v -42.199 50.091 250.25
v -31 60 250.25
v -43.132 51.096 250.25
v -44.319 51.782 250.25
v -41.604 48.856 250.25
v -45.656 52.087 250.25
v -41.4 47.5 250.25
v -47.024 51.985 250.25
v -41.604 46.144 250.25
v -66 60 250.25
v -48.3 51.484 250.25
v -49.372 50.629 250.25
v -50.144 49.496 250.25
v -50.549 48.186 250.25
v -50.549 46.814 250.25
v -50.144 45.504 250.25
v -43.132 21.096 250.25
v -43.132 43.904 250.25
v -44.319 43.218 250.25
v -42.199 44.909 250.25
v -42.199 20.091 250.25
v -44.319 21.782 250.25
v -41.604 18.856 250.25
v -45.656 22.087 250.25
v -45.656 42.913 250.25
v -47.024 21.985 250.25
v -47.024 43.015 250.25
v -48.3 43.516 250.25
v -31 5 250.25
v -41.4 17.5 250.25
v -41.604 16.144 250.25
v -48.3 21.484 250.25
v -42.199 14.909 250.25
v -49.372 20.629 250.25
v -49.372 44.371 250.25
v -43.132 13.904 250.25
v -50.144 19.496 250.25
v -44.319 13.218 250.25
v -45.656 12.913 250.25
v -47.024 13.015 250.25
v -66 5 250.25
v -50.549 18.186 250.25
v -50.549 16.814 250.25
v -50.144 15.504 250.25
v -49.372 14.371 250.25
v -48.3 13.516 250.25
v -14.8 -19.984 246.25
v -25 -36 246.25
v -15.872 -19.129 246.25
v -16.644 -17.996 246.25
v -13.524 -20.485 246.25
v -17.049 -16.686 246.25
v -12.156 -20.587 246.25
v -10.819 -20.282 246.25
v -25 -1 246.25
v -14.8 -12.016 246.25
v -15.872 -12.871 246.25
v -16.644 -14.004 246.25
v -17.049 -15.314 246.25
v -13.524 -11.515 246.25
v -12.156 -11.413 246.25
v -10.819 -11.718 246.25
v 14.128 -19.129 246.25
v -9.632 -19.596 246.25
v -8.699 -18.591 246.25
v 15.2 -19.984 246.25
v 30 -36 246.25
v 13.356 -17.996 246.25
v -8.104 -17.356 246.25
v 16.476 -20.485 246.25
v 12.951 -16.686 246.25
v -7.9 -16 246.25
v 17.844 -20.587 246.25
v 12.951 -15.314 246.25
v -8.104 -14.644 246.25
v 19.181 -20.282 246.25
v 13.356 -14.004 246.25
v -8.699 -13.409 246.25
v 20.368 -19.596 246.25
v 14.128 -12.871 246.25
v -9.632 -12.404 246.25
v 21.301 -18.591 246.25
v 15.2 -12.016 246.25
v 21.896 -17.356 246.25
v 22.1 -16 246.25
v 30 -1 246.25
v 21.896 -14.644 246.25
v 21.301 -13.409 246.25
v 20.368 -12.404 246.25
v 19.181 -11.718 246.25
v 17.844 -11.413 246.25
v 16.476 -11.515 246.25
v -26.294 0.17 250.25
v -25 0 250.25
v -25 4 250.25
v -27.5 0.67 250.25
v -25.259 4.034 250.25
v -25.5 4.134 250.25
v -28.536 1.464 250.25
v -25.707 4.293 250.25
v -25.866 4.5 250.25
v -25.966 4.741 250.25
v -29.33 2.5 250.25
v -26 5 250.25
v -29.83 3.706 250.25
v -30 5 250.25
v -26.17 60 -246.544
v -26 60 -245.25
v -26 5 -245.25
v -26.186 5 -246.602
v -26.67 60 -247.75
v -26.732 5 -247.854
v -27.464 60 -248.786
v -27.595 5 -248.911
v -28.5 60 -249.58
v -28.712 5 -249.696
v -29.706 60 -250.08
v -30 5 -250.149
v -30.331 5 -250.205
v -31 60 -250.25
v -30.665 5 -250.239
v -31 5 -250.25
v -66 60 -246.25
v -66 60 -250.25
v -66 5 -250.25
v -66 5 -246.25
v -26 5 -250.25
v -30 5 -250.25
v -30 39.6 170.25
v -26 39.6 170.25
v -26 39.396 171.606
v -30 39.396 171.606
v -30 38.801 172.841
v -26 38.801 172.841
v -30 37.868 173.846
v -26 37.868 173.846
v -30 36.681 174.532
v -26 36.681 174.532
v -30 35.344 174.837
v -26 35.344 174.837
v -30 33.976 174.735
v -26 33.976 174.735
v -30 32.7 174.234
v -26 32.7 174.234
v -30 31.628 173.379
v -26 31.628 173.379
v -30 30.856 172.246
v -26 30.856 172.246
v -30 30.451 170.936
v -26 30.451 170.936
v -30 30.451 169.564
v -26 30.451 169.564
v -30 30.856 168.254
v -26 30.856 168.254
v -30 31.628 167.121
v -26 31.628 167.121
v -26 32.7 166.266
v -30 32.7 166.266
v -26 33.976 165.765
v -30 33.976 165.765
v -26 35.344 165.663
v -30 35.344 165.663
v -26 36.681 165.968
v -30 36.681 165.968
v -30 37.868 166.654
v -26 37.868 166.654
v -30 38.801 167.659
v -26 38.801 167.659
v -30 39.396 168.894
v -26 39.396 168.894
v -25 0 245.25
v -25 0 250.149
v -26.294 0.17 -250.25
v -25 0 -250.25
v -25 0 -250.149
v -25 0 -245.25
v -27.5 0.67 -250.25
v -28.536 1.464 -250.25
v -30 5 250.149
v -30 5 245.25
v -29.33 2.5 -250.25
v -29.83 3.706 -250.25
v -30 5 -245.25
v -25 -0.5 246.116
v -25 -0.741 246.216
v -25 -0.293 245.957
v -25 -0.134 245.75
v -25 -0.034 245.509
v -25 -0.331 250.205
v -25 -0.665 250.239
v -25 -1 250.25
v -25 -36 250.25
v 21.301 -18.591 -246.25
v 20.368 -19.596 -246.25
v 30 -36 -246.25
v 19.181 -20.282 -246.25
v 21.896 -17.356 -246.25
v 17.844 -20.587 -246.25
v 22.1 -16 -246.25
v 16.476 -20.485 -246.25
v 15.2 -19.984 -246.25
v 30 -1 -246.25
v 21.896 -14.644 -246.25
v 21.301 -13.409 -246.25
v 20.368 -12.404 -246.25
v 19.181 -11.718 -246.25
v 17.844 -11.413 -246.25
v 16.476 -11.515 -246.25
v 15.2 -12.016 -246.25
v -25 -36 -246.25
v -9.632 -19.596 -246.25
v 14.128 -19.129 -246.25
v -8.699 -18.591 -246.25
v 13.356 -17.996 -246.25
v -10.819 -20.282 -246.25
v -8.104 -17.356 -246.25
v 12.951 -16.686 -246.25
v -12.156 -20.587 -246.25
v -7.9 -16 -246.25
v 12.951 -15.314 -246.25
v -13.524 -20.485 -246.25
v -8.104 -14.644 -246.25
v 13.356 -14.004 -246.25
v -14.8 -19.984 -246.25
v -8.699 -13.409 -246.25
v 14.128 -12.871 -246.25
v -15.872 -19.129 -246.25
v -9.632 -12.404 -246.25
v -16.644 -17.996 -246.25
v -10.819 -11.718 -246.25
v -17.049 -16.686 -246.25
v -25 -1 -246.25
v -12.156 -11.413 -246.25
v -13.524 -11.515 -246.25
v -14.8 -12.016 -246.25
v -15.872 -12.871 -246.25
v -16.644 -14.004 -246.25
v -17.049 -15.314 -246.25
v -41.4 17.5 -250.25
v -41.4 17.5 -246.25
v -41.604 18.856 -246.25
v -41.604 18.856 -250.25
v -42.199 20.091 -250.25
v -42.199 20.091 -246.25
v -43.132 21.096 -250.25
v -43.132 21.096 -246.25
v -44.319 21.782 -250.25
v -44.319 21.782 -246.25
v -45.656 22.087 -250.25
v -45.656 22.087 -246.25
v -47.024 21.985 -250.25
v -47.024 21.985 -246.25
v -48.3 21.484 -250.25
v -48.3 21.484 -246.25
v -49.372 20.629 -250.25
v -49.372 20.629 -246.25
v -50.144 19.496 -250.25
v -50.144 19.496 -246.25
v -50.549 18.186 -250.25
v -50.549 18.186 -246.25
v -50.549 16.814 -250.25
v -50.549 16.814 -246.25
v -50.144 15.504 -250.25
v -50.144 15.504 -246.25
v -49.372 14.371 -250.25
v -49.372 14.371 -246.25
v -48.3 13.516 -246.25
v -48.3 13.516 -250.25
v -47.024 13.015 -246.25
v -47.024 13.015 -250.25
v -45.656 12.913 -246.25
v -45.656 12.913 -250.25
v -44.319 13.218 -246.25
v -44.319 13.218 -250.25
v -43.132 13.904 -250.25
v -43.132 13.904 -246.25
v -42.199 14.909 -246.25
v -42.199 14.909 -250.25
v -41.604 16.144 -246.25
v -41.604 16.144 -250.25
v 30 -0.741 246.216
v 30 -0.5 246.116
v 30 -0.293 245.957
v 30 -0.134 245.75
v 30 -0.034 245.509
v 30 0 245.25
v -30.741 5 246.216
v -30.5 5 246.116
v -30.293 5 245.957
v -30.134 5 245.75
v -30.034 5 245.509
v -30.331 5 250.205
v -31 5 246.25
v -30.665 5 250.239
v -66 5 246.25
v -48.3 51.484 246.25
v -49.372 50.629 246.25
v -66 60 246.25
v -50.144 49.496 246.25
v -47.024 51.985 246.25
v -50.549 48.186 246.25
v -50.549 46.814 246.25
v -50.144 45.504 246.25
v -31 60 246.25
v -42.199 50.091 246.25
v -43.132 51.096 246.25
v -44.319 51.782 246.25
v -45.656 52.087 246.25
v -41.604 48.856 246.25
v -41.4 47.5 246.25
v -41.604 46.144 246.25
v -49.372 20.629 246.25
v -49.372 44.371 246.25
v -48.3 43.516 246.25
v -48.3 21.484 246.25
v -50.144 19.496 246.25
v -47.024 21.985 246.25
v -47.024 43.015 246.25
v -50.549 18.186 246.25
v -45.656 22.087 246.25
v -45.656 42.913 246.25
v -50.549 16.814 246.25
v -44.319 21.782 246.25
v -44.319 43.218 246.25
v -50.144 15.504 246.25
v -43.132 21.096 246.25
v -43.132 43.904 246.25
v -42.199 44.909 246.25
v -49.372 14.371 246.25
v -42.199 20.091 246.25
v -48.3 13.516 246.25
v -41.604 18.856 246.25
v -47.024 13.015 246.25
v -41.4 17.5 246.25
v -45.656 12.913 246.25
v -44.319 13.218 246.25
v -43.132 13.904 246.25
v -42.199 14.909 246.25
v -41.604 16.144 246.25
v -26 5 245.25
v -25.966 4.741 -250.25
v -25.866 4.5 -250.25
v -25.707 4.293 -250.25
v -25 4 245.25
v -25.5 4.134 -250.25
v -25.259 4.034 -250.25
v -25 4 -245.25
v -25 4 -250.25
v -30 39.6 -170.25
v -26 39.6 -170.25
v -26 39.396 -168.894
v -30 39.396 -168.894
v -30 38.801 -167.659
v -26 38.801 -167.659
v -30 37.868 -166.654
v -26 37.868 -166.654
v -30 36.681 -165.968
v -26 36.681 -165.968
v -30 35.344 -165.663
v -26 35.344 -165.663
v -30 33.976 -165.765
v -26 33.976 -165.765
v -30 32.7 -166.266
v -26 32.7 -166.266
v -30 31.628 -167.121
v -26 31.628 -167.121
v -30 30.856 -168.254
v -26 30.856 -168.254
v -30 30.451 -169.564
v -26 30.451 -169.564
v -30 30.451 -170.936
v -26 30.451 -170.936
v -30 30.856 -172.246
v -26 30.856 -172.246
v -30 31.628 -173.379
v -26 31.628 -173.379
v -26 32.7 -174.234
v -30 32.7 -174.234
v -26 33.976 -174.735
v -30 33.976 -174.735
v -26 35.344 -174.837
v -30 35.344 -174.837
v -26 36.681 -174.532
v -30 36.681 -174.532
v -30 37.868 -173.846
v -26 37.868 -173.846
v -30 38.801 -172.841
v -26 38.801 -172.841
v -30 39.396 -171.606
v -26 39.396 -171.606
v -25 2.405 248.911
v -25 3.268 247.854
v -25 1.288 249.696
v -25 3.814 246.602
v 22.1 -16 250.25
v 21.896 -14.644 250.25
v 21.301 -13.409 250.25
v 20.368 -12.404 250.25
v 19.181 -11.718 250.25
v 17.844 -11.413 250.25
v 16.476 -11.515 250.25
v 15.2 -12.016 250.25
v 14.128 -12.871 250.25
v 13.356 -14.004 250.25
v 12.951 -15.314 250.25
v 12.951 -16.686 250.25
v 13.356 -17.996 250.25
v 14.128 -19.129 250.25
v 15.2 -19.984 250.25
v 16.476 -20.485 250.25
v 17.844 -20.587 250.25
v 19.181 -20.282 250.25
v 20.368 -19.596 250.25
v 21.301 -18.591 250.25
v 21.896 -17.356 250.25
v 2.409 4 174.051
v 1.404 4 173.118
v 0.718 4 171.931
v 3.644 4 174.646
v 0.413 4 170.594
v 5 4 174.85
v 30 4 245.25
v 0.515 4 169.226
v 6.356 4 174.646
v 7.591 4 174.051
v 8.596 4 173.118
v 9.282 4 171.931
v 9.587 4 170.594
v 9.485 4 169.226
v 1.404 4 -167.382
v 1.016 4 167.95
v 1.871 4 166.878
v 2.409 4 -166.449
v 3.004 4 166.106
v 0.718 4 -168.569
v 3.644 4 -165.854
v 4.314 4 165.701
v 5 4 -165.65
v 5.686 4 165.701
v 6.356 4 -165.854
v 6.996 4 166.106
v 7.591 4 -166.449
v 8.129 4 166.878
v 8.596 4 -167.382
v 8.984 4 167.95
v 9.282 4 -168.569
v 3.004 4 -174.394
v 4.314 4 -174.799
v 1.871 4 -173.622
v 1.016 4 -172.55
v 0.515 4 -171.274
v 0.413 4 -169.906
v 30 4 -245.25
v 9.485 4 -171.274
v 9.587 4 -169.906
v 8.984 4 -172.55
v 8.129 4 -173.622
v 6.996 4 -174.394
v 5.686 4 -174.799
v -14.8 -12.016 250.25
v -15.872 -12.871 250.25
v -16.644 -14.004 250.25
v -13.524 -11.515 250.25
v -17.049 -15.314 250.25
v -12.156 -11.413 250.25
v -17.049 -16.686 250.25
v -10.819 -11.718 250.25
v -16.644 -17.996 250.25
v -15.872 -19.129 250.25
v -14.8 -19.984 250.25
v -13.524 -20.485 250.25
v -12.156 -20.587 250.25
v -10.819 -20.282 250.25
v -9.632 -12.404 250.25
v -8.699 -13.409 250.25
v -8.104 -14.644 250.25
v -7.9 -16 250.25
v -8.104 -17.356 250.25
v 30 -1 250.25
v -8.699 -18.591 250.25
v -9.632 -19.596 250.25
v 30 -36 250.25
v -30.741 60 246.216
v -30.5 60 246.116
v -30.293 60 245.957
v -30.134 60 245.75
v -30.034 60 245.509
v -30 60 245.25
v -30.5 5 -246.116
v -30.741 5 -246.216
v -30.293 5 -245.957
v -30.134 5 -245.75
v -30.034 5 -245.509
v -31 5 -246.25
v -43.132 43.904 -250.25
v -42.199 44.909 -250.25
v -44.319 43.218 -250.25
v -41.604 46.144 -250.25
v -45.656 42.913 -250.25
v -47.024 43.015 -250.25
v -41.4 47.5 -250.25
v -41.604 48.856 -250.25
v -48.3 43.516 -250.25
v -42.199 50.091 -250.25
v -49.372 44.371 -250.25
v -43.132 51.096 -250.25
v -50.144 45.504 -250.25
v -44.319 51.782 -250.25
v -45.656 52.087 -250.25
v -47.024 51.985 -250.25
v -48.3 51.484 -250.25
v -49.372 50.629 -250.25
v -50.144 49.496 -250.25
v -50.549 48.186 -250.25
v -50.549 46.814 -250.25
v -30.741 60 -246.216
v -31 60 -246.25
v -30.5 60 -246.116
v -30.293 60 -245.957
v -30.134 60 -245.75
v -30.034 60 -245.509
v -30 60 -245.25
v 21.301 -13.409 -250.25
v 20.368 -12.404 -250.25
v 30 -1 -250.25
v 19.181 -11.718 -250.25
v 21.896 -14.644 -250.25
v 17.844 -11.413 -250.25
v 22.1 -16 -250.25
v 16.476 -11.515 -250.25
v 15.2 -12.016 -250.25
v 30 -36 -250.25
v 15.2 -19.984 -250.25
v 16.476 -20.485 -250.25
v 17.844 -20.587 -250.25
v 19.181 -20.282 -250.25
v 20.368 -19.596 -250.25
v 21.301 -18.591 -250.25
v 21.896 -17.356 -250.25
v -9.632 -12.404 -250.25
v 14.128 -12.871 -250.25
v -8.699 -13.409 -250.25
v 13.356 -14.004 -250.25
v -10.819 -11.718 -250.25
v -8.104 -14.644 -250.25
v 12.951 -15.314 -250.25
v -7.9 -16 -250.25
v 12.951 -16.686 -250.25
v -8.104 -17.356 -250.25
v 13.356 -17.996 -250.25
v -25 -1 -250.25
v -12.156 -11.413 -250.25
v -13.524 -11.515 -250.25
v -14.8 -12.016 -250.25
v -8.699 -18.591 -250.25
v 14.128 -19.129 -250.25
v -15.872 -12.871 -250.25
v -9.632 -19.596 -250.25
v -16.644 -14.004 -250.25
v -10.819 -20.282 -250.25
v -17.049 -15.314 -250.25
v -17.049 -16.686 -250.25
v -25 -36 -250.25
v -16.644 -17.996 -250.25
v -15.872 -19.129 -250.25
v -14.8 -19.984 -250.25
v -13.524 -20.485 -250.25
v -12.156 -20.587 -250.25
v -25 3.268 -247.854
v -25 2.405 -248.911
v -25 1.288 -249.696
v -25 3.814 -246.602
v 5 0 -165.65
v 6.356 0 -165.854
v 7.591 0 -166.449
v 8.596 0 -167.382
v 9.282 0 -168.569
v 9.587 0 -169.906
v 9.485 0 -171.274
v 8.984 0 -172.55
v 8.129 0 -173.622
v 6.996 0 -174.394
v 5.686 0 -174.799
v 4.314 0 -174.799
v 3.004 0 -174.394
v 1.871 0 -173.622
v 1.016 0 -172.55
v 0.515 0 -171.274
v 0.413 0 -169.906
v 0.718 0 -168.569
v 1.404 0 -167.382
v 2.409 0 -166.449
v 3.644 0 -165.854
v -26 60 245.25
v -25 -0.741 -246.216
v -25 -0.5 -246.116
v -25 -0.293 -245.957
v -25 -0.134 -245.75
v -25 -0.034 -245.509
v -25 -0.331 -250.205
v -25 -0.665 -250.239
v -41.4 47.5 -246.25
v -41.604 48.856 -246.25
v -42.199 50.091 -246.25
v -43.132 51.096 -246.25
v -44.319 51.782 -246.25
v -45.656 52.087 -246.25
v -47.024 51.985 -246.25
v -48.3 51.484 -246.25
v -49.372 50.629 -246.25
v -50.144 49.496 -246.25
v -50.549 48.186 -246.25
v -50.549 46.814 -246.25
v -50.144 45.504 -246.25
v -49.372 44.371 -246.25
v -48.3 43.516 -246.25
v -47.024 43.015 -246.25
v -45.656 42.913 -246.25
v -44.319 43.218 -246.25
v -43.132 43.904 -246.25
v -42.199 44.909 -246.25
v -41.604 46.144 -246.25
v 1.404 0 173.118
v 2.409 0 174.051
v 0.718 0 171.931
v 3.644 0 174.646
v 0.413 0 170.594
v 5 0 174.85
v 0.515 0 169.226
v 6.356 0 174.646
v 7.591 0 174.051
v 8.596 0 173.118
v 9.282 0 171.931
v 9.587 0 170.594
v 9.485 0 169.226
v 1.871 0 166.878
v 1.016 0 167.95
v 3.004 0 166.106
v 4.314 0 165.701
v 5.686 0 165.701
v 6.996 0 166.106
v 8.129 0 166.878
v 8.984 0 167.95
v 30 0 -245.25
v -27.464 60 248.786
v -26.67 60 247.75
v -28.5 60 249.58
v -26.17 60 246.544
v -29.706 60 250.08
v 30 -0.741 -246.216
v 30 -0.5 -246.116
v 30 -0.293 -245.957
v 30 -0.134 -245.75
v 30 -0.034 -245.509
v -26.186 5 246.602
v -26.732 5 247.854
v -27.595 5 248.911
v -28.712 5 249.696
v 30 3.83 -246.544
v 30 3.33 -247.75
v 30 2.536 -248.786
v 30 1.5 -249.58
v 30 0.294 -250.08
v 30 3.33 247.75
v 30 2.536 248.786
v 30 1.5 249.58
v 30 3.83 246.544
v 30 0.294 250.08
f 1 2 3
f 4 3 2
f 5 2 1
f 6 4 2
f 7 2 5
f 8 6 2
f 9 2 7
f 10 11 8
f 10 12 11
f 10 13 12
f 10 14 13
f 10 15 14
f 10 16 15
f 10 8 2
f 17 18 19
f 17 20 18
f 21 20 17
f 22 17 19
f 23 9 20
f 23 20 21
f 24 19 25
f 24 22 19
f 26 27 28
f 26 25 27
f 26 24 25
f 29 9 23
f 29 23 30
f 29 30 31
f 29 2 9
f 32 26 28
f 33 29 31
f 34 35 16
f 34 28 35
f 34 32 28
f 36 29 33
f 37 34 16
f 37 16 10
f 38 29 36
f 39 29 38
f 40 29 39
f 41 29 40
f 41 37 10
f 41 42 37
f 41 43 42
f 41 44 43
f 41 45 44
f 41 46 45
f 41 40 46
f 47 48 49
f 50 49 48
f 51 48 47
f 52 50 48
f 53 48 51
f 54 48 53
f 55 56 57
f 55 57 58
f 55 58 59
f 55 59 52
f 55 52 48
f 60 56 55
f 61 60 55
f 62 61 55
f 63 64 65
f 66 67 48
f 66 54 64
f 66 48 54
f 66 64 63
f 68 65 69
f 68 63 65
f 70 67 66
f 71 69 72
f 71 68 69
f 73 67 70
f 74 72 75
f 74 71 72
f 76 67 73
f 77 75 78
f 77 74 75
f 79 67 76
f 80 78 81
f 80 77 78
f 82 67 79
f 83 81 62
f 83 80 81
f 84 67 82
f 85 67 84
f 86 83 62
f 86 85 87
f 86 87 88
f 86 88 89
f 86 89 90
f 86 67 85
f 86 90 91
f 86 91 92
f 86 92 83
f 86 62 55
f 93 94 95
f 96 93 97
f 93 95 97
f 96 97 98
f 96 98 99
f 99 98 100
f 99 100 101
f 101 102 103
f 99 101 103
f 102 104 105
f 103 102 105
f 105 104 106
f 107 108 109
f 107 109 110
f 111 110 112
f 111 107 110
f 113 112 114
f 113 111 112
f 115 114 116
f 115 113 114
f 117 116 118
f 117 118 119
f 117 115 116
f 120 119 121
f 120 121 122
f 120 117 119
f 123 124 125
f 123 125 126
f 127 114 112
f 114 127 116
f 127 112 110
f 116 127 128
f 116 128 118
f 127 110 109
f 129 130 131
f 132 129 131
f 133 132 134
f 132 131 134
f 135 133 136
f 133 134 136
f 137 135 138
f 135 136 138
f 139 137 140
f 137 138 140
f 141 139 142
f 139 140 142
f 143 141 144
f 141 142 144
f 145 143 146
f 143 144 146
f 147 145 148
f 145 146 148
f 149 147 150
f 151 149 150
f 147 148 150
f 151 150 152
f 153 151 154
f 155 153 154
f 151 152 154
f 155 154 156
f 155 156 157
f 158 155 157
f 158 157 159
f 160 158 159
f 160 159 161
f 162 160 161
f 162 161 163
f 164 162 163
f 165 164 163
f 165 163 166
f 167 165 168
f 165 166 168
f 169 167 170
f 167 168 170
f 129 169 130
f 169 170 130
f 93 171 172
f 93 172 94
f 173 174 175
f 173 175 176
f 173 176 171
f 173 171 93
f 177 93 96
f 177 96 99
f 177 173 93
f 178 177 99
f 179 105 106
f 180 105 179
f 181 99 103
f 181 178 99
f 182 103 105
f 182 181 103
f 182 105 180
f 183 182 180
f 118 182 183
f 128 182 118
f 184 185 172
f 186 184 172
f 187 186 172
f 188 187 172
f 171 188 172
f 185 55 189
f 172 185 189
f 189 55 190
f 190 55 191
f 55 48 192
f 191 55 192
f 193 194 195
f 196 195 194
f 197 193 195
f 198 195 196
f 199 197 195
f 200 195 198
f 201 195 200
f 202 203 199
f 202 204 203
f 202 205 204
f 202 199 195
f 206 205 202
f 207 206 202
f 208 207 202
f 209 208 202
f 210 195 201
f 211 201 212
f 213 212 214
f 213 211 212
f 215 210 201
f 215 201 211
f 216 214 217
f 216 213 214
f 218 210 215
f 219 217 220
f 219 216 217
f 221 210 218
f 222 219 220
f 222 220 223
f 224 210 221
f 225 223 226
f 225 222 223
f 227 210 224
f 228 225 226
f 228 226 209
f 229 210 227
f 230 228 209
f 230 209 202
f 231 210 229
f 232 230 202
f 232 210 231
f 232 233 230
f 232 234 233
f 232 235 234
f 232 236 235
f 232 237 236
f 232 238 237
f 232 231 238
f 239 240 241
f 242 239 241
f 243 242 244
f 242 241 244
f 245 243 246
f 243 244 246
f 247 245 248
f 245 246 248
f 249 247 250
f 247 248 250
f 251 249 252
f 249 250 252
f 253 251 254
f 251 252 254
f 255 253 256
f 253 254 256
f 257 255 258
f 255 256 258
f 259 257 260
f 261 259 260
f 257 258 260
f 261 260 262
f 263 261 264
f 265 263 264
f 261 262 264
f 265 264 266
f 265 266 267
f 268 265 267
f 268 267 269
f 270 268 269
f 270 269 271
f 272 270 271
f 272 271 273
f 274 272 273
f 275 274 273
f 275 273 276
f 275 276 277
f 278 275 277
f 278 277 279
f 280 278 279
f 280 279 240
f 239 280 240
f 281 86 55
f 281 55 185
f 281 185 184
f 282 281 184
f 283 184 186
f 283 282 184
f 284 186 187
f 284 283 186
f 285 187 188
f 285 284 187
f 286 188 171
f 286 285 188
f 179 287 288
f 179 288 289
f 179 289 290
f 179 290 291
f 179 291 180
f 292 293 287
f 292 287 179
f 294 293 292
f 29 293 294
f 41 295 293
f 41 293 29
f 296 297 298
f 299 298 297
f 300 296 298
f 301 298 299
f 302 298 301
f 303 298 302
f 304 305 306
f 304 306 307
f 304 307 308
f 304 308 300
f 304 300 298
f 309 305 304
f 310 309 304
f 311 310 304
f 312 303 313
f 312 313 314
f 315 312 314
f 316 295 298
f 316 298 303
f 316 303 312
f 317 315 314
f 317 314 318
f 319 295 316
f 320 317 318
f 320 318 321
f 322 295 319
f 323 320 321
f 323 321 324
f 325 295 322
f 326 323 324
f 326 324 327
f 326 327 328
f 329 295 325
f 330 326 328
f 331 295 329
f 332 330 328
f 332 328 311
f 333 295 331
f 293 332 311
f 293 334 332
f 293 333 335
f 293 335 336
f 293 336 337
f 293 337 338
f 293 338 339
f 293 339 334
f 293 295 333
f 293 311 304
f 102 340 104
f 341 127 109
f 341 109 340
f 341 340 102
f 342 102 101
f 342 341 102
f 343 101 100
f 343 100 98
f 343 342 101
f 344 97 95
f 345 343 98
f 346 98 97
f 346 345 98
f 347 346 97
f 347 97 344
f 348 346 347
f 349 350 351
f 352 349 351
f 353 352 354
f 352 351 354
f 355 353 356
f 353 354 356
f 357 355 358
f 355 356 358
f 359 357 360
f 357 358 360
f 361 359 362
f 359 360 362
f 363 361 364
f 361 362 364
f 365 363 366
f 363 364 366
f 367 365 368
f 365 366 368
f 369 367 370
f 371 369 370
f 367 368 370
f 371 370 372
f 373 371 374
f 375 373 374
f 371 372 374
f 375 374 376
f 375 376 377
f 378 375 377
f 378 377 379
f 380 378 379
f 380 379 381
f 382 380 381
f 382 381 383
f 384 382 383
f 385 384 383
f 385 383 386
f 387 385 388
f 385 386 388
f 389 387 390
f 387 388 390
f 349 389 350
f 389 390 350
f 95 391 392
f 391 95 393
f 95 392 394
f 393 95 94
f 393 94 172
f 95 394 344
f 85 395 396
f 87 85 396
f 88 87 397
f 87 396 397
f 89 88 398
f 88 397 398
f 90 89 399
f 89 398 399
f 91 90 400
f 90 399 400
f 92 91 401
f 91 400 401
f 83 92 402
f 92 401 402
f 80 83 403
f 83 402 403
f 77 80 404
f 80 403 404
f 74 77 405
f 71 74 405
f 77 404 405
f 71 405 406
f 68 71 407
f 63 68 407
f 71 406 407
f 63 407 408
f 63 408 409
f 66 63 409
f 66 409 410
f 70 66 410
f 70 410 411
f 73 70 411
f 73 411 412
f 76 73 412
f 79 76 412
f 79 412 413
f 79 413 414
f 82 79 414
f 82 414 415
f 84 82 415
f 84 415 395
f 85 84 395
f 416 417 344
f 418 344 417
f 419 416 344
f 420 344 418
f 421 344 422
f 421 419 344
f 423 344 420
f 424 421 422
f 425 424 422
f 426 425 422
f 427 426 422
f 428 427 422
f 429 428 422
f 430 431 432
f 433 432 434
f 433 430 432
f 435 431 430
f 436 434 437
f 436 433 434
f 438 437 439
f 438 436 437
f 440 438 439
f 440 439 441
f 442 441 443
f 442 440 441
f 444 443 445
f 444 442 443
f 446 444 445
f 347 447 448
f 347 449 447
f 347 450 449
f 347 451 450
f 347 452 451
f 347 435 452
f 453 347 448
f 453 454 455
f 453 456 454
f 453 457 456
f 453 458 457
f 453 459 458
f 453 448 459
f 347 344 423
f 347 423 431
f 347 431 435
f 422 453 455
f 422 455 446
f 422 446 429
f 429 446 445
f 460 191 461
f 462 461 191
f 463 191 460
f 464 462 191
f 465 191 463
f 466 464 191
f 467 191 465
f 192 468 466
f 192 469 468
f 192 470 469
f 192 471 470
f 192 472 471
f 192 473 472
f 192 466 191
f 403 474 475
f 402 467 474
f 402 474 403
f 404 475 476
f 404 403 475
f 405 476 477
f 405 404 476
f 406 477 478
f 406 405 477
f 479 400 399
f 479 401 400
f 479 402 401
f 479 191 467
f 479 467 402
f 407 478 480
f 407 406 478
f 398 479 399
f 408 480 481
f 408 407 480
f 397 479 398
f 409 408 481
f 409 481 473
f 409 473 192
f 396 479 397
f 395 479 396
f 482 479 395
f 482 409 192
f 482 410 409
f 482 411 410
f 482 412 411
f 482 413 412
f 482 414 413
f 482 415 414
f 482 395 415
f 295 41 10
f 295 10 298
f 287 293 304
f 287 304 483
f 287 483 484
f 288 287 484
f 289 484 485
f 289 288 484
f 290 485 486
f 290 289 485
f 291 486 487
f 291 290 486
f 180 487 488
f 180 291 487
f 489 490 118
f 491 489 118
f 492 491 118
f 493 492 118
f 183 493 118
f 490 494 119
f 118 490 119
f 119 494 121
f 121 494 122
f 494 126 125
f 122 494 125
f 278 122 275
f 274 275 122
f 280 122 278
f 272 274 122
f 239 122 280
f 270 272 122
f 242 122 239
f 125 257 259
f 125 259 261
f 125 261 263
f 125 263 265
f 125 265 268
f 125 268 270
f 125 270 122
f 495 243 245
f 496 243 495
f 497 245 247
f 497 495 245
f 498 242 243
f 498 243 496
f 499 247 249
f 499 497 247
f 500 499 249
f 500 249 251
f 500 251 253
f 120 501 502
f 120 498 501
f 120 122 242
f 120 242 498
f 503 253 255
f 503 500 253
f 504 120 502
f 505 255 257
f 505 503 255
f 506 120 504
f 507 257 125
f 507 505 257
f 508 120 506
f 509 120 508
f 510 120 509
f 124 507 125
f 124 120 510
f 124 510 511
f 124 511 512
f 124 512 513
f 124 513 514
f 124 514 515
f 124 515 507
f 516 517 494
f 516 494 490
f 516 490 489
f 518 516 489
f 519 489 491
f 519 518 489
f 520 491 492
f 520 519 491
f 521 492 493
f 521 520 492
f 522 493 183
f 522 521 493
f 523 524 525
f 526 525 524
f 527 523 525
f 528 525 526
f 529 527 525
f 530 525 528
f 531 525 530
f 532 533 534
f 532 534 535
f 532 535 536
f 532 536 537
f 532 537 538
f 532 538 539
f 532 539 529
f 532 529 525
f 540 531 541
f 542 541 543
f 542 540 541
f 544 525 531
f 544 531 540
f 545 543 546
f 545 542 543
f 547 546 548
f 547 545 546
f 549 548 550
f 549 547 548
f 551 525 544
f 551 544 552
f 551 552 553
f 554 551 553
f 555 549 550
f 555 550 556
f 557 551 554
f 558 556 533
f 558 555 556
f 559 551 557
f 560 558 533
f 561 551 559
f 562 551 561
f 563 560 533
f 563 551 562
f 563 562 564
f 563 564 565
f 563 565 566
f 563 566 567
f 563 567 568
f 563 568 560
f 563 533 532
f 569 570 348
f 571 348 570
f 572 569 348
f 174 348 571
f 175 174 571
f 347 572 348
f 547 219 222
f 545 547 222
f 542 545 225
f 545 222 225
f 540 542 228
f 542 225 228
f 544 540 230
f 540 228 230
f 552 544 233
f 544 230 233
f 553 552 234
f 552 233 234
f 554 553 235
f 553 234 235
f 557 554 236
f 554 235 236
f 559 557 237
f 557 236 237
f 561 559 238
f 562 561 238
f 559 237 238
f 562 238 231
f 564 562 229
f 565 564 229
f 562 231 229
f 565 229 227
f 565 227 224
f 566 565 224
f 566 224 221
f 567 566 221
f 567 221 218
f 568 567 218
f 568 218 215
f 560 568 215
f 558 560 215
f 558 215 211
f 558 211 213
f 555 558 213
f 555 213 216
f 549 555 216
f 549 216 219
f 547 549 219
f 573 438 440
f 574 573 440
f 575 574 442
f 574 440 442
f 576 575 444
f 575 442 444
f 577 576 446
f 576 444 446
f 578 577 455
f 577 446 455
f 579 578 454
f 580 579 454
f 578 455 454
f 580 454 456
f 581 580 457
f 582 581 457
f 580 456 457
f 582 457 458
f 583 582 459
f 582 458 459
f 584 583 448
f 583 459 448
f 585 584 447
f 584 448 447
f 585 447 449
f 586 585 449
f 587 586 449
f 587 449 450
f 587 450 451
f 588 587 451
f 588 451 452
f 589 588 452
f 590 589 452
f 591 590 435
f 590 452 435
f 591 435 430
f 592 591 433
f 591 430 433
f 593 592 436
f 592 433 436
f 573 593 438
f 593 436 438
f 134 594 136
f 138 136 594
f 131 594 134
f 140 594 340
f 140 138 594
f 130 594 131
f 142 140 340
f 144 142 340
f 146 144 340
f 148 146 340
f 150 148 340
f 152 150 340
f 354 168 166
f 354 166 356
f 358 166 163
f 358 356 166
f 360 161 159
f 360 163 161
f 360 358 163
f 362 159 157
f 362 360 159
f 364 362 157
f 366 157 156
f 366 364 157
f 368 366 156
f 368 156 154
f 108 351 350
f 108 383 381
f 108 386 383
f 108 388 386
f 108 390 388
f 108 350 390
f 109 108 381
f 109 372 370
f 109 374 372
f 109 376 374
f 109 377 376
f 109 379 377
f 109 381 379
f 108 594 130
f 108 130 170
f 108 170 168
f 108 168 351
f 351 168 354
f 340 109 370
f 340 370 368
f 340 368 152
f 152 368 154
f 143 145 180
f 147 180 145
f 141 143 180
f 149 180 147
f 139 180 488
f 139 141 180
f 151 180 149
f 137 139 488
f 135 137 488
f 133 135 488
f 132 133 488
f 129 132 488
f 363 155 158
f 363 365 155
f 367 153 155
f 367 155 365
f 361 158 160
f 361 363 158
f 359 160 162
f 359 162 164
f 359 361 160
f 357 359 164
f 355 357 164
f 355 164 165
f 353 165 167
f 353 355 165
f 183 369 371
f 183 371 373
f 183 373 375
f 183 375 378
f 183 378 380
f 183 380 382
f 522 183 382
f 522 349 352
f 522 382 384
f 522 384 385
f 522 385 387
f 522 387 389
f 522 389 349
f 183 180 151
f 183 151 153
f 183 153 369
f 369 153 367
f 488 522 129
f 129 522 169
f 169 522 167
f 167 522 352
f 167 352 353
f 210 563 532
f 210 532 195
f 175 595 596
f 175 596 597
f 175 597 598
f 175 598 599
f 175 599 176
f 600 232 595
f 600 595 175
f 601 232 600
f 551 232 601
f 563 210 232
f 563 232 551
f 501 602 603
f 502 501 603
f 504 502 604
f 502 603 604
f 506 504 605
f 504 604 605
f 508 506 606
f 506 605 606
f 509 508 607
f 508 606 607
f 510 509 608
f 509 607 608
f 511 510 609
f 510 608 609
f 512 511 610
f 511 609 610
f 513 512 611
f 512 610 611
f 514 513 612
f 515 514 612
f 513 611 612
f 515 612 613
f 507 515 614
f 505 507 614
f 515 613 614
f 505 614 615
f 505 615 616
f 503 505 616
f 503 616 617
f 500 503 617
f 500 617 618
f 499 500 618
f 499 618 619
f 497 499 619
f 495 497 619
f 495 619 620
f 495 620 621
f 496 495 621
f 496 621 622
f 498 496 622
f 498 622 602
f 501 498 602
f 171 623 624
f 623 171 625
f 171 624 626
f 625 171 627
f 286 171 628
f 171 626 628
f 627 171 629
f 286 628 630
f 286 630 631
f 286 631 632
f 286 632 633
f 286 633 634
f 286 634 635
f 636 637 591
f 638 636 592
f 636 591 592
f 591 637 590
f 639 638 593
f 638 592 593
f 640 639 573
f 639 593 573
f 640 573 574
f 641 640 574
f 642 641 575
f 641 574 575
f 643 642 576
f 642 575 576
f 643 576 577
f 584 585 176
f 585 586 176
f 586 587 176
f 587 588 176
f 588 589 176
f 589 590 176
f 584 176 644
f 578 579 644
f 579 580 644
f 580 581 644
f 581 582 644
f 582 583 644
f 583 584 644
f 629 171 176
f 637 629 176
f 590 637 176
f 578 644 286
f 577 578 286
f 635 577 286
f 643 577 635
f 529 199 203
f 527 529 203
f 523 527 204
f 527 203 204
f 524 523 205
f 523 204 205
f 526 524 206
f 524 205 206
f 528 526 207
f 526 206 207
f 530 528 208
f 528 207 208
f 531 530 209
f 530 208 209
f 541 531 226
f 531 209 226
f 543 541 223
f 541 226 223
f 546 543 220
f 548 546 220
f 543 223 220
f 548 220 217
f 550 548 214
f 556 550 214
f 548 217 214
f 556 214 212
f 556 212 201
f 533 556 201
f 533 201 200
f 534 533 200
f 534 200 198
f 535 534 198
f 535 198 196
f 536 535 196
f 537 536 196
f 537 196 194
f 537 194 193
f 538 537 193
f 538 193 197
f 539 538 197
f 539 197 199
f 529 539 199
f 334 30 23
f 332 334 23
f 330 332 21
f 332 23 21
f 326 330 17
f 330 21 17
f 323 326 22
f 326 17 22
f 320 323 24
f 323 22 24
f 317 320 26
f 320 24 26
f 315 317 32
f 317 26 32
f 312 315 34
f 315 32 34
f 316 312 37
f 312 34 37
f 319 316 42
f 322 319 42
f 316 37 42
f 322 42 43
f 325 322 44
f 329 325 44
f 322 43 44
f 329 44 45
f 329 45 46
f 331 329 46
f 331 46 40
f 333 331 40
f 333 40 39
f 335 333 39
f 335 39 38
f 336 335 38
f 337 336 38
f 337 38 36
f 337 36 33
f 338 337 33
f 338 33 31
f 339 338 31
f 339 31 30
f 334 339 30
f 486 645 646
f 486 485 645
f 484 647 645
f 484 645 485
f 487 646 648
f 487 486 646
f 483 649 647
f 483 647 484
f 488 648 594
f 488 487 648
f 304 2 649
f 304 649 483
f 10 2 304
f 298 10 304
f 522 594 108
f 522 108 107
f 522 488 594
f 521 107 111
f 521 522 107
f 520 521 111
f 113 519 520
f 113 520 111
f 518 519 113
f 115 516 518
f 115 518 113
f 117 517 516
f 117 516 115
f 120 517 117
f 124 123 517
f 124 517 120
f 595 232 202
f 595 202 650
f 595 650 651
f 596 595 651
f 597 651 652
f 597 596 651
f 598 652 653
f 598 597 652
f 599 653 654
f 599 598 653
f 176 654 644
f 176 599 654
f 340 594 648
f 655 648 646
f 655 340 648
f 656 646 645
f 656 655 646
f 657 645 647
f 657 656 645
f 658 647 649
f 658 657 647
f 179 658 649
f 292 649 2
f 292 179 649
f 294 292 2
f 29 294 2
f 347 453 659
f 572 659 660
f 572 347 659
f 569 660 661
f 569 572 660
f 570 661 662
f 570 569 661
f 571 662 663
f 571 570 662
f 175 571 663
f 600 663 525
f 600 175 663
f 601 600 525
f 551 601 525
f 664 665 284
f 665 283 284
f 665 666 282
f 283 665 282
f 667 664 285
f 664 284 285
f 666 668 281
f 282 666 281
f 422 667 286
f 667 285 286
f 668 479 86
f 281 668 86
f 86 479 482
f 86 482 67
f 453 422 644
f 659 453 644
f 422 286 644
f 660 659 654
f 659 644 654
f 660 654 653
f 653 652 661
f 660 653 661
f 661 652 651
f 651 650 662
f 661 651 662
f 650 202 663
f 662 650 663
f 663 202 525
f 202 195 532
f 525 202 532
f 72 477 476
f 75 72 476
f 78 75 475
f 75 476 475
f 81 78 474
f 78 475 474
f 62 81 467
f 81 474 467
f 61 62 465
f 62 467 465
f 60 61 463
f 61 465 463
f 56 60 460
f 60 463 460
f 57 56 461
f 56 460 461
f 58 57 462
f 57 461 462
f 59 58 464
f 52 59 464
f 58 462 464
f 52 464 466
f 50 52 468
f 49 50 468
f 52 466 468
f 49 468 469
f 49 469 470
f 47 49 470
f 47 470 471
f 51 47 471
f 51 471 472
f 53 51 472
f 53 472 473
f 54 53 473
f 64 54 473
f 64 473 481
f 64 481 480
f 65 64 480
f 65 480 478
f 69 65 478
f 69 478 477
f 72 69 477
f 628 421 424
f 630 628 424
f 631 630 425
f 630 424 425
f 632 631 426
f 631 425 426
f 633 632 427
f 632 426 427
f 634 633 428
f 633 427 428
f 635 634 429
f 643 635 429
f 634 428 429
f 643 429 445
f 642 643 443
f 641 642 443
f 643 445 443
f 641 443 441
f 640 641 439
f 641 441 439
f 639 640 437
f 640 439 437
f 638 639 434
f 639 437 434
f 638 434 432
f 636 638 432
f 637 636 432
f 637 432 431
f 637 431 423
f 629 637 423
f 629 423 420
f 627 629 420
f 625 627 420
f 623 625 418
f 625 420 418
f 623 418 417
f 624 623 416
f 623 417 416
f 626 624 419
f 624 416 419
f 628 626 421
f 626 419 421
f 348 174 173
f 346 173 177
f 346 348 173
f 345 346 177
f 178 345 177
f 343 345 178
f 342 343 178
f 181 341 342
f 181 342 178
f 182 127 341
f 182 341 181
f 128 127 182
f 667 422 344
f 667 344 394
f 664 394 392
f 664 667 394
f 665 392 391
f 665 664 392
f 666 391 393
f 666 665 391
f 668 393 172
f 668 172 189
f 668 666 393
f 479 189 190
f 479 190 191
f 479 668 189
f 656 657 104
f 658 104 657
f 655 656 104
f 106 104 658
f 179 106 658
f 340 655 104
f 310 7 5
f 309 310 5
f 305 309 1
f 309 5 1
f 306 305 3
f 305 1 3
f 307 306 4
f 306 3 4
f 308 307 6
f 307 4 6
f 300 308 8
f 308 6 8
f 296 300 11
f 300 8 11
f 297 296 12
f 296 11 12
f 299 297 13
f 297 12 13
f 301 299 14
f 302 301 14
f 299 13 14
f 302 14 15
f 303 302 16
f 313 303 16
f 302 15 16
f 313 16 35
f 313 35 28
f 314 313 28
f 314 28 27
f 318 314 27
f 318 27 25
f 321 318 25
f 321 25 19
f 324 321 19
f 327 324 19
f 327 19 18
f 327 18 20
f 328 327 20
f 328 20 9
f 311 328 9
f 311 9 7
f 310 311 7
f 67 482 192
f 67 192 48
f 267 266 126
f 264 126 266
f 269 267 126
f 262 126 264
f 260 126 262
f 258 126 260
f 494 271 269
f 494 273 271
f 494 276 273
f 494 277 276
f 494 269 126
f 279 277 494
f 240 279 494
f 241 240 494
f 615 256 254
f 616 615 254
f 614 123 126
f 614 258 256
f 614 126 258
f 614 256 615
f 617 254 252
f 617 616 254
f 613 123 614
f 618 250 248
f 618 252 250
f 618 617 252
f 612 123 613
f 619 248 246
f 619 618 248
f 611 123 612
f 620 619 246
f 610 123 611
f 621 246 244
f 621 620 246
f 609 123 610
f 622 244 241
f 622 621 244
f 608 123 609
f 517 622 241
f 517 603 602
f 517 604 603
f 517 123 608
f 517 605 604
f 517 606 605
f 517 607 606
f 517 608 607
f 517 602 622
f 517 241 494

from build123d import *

# Parameters (mm, degrees)
SKETCH1_W                      = 60
SKETCH1_H                      = 500.5
BASE_FLANGE1_DEPTH             = 4
EDGE_FLANGE1_STRIP_W           = 18
EDGE_FLANGE1_STRIP_H           = 4
EDGE_FLANGE1_STRIP_CUT_DEPTH   = 500.5
EDGE_FLANGE1_DEPTH             = 500.5
EDGE_FLANGE2_STRIP_W           = 18
EDGE_FLANGE2_STRIP_H           = 4
EDGE_FLANGE2_STRIP_CUT_DEPTH   = 55
EDGE_FLANGE2_STRIP_2_W         = 18
EDGE_FLANGE2_STRIP_2_H         = 4
EDGE_FLANGE2_STRIP_CUT_2_DEPTH = 55
EDGE_FLANGE2_STRIP_3_W         = 18
EDGE_FLANGE2_STRIP_3_H         = 4
EDGE_FLANGE2_STRIP_CUT_3_DEPTH = 55
EDGE_FLANGE2_STRIP_4_W         = 18
EDGE_FLANGE2_STRIP_4_H         = 4
EDGE_FLANGE2_STRIP_CUT_4_DEPTH = 55
EDGE_FLANGE2_DEPTH             = 55
EDGE_FLANGE2_BEND_DEPTH        = 55
EDGE_FLANGE2_BEND_2_DEPTH      = 55
EDGE_FLANGE2_BEND_3_DEPTH      = 55
SKETCH18_R                     = 4.6
EXTRUDE1_DEPTH                 = 509.385926241
SKETCH19_R                     = 4.6
EXTRUDE2_DEPTH                 = 4
SKETCH20_R                     = 4.6
EXTRUDE3_DEPTH                 = 4


# Sheet-metal steps are written as plain solids
with BuildPart() as part:
    # Sketch1 → Base-Flange1 (new body)
    with BuildSketch(Plane(origin=(0, 0, 0), x_dir=(1, 0, 0), z_dir=(0, 1, 0))):
        Rectangle(SKETCH1_W, SKETCH1_H)
    extrude(amount=BASE_FLANGE1_DEPTH)

    # Edge-Flange1 strip (across the edge) → Edge-Flange1 strip cut (cut)
    with BuildSketch(Plane(origin=(-30, 4, -250.25), x_dir=(1, 0, 0), z_dir=(0, 0, 1))):
        with Locations((-4, -2)):
            Rectangle(EDGE_FLANGE1_STRIP_W, EDGE_FLANGE1_STRIP_H)
    extrude(amount=EDGE_FLANGE1_STRIP_CUT_DEPTH, mode=Mode.SUBTRACT)

    # Edge-Flange1 section (across the edge) → Edge-Flange1 (add)
    with BuildSketch(Plane(origin=(-30, 4, -250.25), x_dir=(1, 0, 0), z_dir=(0, 0, 1))):
        with BuildLine():
            Line((0, 1), (0, 56))
            Line((0, 56), (4, 56))
            Line((4, 56), (4, 1))
            ThreePointArc((4, 1), (4.292893219, 0.292893219), (5, 0))
            Line((5, 0), (5, -4))
            ThreePointArc((5, -4), (1.464466094, -2.535533906), (0, 1))
        make_face()
    extrude(amount=EDGE_FLANGE1_DEPTH)

    # Edge-Flange2 strip (across the edge) → Edge-Flange2 strip cut (cut)
    with BuildSketch(Plane(origin=(-30, 5, 250.25), x_dir=(0, 0, -1), z_dir=(0, 1, 0))):
        with Locations((-4, -2)):
            Rectangle(EDGE_FLANGE2_STRIP_W, EDGE_FLANGE2_STRIP_H)
    extrude(amount=EDGE_FLANGE2_STRIP_CUT_DEPTH, mode=Mode.SUBTRACT)

    # Edge-Flange2 strip 2 (across the edge) → Edge-Flange2 strip cut 2 (cut)
    with BuildSketch(Plane(origin=(30, 0, 250.25), x_dir=(0, 0, -1), z_dir=(-1, 0, 0))):
        with Locations((-4, -2)):
            Rectangle(EDGE_FLANGE2_STRIP_2_W, EDGE_FLANGE2_STRIP_2_H)
    extrude(amount=EDGE_FLANGE2_STRIP_CUT_2_DEPTH, mode=Mode.SUBTRACT)

    # Edge-Flange2 strip 3 (across the edge) → Edge-Flange2 strip cut 3 (cut)
    with BuildSketch(Plane(origin=(-30, 60, -250.25), x_dir=(0, 0, 1), z_dir=(0, -1, 0))):
        with Locations((-4, -2)):
            Rectangle(EDGE_FLANGE2_STRIP_3_W, EDGE_FLANGE2_STRIP_3_H)
    extrude(amount=EDGE_FLANGE2_STRIP_CUT_3_DEPTH, mode=Mode.SUBTRACT)

    # Edge-Flange2 strip 4 (across the edge) → Edge-Flange2 strip cut 4 (cut)
    with BuildSketch(Plane(origin=(-25, 0, -250.25), x_dir=(0, 0, 1), z_dir=(1, 0, 0))):
        with Locations((-4, -2)):
            Rectangle(EDGE_FLANGE2_STRIP_4_W, EDGE_FLANGE2_STRIP_4_H)
    extrude(amount=EDGE_FLANGE2_STRIP_CUT_4_DEPTH, mode=Mode.SUBTRACT)

    # Edge-Flange2 section (across the edge) → Edge-Flange2 (add)
    with BuildSketch(Plane(origin=(-30, 5, 250.25), x_dir=(0, 0, -1), z_dir=(0, 1, 0))):
        with BuildLine():
            Line((0, 1), (0, 36))
            Line((0, 36), (4, 36))
            Line((4, 36), (4, 1))
            ThreePointArc((4, 1), (4.292893219, 0.292893219), (5, 0))
            Line((5, 0), (5, -4))
            ThreePointArc((5, -4), (1.464466094, -2.535533906), (0, 1))
        make_face()
    extrude(amount=EDGE_FLANGE2_DEPTH)

    # Edge-Flange2 section 2 (across the edge) → Edge-Flange2 bend (add)
    with BuildSketch(Plane(origin=(30, 0, 250.25), x_dir=(0, 0, -1), z_dir=(-1, 0, 0))):
        with BuildLine():
            Line((0, 1), (0, 36))
            Line((0, 36), (4, 36))
            Line((4, 36), (4, 1))
            ThreePointArc((4, 1), (4.292893219, 0.292893219), (5, 0))
            Line((5, 0), (5, -4))
            ThreePointArc((5, -4), (1.464466094, -2.535533906), (0, 1))
        make_face()
    extrude(amount=EDGE_FLANGE2_BEND_DEPTH)

    # Edge-Flange2 section 3 (across the edge) → Edge-Flange2 bend 2 (add)
    with BuildSketch(Plane(origin=(-30, 60, -250.25), x_dir=(0, 0, 1), z_dir=(0, -1, 0))):
        with BuildLine():
            Line((0, 1), (0, 36))
            Line((0, 36), (4, 36))
            Line((4, 36), (4, 1))
            ThreePointArc((4, 1), (4.292893219, 0.292893219), (5, 0))
            Line((5, 0), (5, -4))
            ThreePointArc((5, -4), (1.464466094, -2.535533906), (0, 1))
        make_face()
    extrude(amount=EDGE_FLANGE2_BEND_2_DEPTH)

    # Edge-Flange2 section 4 (across the edge) → Edge-Flange2 bend 3 (add)
    with BuildSketch(Plane(origin=(-25, 0, -250.25), x_dir=(0, 0, 1), z_dir=(1, 0, 0))):
        with BuildLine():
            Line((0, 1), (0, 36))
            Line((0, 36), (4, 36))
            Line((4, 36), (4, 1))
            ThreePointArc((4, 1), (4.292893219, 0.292893219), (5, 0))
            Line((5, 0), (5, -4))
            ThreePointArc((5, -4), (1.464466094, -2.535533906), (0, 1))
        make_face()
    extrude(amount=EDGE_FLANGE2_BEND_3_DEPTH)

    # Sketch18 → Extrude1 (cut, through all)
    with BuildSketch(Plane.XY.offset(250.25)):
        with Locations((-46, 47.5)):
            Circle(SKETCH18_R)
        with Locations((-46, 17.5)):
            Circle(SKETCH18_R)
        with Locations((-12.5, -16)):
            Circle(SKETCH18_R)
        with Locations((17.5, -16)):
            Circle(SKETCH18_R)
    extrude(amount=-EXTRUDE1_DEPTH, mode=Mode.SUBTRACT)

    # Sketch19 → Extrude2 (cut)
    with BuildSketch(Plane(origin=(-26, 0, 0), x_dir=(0, 0, -1), z_dir=(1, 0, 0))):
        with Locations(Location((-170.25, 35, 0), (0, 0, 90))):
            Circle(SKETCH19_R)
        with Locations(Location((170.25, 35, 0), (0, 0, 90))):
            Circle(SKETCH19_R)
    extrude(amount=-EXTRUDE2_DEPTH, mode=Mode.SUBTRACT)

    # Sketch20 → Extrude3 (cut)
    with BuildSketch(Plane(origin=(0, 4, 0), x_dir=(1, 0, 0), z_dir=(0, 1, 0))):
        with Locations(Location((5, 170.25, 0), (0, 0, 270))):
            Circle(SKETCH20_R)
        with Locations(Location((5, -170.25, 0), (0, 0, 270))):
            Circle(SKETCH20_R)
    extrude(amount=-EXTRUDE3_DEPTH, mode=Mode.SUBTRACT)


solid = part.part
